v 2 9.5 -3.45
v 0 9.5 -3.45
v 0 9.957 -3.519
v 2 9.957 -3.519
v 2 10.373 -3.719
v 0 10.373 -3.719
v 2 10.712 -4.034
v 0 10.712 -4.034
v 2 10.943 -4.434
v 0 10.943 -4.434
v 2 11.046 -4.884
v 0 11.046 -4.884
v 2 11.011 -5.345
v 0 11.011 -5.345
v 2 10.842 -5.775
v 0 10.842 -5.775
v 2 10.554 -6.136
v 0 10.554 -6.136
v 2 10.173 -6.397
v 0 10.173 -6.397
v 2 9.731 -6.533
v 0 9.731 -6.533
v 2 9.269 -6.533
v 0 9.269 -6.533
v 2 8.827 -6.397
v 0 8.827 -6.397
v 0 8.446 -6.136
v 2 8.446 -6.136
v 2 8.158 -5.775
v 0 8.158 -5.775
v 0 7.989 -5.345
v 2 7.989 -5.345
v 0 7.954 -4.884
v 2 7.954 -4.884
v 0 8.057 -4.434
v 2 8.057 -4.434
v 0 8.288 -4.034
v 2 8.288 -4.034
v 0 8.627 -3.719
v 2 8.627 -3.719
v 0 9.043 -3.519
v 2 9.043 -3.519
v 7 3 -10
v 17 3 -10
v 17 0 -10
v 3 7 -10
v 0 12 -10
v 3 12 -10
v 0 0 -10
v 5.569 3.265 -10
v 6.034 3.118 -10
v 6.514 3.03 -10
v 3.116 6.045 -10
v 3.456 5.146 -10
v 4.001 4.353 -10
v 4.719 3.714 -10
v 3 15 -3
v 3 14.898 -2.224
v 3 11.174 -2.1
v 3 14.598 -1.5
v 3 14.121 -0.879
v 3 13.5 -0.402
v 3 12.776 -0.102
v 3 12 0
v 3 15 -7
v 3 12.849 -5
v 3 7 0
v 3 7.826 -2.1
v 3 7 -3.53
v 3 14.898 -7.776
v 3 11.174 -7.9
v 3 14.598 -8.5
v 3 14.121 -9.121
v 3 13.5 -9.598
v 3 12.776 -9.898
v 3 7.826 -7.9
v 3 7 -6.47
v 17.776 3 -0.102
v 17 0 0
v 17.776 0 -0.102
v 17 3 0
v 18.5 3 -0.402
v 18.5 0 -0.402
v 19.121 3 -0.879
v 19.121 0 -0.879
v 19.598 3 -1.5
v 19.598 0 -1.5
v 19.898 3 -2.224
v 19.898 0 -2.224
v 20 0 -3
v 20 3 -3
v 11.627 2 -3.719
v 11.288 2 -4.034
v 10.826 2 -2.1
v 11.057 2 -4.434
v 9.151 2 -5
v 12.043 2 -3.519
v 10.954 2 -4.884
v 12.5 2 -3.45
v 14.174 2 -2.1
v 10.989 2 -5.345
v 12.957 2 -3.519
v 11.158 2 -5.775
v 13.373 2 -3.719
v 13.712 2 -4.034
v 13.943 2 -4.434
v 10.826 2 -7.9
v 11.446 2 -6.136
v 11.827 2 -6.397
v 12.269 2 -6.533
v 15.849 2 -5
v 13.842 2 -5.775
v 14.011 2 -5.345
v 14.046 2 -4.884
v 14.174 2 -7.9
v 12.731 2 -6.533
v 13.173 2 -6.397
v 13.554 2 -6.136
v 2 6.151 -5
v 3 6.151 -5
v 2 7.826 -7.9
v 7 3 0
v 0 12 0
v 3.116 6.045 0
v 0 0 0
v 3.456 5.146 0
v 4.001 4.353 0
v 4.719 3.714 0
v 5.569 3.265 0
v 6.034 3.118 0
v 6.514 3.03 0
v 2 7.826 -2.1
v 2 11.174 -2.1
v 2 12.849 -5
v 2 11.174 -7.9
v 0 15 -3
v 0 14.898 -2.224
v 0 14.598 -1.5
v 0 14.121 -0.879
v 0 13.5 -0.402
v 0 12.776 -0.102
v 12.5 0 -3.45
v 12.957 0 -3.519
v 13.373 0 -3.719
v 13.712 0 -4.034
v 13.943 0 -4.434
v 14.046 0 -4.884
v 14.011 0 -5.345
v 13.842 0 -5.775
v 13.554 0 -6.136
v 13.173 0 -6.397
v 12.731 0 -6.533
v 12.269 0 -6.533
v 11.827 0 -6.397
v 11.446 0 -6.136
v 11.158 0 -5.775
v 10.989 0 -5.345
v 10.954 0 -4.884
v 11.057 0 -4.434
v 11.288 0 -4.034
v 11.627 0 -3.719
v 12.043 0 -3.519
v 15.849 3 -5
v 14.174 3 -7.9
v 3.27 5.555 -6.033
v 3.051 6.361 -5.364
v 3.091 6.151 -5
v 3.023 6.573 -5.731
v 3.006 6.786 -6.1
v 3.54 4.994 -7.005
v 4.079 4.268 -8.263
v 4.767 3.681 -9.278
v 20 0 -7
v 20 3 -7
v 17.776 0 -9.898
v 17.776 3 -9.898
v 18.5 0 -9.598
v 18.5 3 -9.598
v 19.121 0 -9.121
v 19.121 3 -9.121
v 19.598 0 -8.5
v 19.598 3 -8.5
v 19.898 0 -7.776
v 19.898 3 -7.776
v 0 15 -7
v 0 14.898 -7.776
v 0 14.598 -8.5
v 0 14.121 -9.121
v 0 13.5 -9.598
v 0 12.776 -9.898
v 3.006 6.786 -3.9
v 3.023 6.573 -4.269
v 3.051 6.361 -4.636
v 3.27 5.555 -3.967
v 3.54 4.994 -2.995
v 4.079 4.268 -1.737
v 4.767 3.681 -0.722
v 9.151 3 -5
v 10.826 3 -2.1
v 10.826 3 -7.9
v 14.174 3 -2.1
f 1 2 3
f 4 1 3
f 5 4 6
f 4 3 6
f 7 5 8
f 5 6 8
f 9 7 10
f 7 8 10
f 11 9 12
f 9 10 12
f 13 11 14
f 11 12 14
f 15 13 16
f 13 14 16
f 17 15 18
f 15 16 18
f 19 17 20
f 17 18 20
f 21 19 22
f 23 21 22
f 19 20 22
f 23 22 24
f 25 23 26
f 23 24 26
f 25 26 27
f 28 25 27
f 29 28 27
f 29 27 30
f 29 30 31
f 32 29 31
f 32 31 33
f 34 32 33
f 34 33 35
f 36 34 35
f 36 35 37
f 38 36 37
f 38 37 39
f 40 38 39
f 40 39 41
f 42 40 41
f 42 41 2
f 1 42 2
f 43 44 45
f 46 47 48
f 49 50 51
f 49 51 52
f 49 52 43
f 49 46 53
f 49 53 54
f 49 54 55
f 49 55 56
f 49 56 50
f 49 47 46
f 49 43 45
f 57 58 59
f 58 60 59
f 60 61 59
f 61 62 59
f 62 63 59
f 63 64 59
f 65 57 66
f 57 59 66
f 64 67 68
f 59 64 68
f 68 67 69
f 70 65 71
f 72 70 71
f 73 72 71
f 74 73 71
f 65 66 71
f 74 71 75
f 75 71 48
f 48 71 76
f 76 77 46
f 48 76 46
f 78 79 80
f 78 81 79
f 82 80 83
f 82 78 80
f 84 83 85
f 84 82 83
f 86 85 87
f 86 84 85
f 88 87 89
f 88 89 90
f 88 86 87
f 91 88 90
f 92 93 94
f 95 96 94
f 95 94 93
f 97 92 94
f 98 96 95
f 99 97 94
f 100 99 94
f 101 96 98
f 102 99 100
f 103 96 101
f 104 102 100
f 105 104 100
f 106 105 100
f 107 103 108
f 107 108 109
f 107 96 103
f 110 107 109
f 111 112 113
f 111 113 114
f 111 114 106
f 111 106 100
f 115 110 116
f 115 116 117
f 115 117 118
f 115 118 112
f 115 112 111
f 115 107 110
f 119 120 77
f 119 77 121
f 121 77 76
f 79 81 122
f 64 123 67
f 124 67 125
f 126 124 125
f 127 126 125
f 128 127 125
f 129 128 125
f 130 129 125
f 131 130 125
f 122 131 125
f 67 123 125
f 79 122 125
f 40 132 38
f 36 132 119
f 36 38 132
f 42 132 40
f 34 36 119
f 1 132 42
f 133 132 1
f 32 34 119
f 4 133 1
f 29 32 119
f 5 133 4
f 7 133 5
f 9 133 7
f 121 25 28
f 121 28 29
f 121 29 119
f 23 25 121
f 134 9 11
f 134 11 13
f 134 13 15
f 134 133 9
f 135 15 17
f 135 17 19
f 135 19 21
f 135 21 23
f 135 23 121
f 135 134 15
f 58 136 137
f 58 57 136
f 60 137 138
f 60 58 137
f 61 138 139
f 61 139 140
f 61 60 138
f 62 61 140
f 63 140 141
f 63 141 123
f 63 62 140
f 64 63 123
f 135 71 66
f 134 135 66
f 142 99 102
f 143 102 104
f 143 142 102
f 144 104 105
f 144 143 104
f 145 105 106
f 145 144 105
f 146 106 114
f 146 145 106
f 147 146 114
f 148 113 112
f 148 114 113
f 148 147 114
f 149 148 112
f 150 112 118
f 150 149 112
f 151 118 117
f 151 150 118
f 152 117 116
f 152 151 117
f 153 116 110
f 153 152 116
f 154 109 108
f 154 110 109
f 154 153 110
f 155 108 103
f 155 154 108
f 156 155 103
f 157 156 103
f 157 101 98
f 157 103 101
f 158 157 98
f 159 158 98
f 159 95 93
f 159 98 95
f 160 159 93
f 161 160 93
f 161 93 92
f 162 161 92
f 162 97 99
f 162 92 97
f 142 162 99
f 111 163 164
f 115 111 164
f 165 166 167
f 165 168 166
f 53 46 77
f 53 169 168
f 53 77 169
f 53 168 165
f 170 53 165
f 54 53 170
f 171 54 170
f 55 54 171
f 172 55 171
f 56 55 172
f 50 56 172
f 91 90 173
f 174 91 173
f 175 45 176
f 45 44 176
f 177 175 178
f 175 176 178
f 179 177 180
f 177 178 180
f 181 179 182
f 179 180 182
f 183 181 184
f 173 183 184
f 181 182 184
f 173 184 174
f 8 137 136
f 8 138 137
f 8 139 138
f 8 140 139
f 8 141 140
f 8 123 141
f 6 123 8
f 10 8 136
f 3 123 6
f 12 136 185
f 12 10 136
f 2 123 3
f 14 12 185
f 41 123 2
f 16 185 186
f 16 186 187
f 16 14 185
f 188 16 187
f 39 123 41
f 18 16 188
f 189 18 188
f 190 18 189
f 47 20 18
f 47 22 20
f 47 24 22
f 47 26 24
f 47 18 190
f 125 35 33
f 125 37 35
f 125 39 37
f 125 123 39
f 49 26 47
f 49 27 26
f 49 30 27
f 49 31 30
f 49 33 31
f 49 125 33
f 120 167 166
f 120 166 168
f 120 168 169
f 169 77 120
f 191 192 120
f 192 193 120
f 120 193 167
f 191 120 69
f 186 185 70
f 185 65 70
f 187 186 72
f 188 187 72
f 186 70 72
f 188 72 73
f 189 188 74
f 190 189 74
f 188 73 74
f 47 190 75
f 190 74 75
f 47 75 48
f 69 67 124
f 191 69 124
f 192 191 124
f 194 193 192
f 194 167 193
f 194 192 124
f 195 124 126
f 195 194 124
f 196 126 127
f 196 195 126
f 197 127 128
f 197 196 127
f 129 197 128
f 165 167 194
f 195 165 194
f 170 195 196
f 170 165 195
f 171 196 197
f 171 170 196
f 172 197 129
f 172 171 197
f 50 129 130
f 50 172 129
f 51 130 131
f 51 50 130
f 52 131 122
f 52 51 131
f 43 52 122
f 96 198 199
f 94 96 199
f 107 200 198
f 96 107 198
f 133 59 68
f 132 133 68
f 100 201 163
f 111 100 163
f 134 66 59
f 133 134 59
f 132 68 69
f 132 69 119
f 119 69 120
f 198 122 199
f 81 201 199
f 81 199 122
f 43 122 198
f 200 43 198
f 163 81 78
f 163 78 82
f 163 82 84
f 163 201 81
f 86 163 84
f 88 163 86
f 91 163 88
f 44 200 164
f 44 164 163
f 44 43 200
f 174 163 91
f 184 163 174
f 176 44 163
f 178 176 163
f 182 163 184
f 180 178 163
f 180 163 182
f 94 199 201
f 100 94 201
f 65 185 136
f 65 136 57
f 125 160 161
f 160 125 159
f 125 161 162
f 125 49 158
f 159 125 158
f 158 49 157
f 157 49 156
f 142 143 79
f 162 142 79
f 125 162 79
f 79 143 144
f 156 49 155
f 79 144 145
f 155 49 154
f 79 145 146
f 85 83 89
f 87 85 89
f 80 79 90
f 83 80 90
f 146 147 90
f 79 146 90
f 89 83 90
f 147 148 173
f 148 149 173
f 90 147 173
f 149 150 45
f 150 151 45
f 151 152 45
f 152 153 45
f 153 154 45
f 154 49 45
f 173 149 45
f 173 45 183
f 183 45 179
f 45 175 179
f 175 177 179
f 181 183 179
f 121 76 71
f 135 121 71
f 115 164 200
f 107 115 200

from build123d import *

# Parameters (mm, degrees)
CROQUIS1_W              = 20
CROQUIS1_H              = 10
CROQUIS1_R              = 1.55
SALIENTE_EXTRUIR1_DEPTH = 3
CROQUIS2_W              = 3
CROQUIS2_H              = 10
SALIENTE_EXTRUIR2_DEPTH = 12
CROQUIS3_R              = 1.55
CORTAR_EXTRUIR1_DEPTH   = 3
CORTAR_EXTRUIR3_DEPTH   = 1
REDONDEO1_R             = 3
REDONDEO2_R             = 4
CORTAR_EXTRUIR4_DEPTH   = 1


with BuildPart() as part:
    # Croquis1 → Saliente-Extruir1 (new body)
    with BuildSketch(Plane(origin=(0, 0, 0), x_dir=(1, 0, 0), z_dir=(0, 1, 0))):
        with Locations((10, 5)):
            Rectangle(CROQUIS1_W, CROQUIS1_H)
        with Locations(Location((12.5, 5, 0), (0, 0, 270))):
            Circle(CROQUIS1_R, mode=Mode.SUBTRACT)
    extrude(amount=SALIENTE_EXTRUIR1_DEPTH)

    # Croquis2 → Saliente-Extruir2 (add)
    with BuildSketch(Plane(origin=(0, 3, 0), x_dir=(1, 0, 0), z_dir=(0, 1, 0))):
        with Locations((1.5, 5)):
            Rectangle(CROQUIS2_W, CROQUIS2_H)
    extrude(amount=SALIENTE_EXTRUIR2_DEPTH)

    # Croquis3 → Cortar-Extruir1 (cut)
    with BuildSketch(Plane.ZY):
        with Locations((-5, 9.5)):
            Circle(CROQUIS3_R)
    extrude(amount=-CORTAR_EXTRUIR1_DEPTH, mode=Mode.SUBTRACT)

    # Croquis5 → Cortar-Extruir3 (cut)
    with BuildSketch(Plane(origin=(3, 0, 0), x_dir=(0, 0, -1), z_dir=(1, 0, 0))):
        Polygon((7.9, 11.174315781), (5, 12.848631561), (2.1, 11.174315781), (2.1, 7.825684219), (5, 6.151368439), (7.9, 7.825684219), align=None)
    extrude(amount=-CORTAR_EXTRUIR3_DEPTH, mode=Mode.SUBTRACT)

    # Redondeo1
    redondeo1_edges = [part.edges().sort_by_distance(p)[0] for p in [
        (1.5, 15, 0),
        (1.5, 15, -10),
        (20, 1.5, -10),
        (20, 1.5, 0),
    ]]
    fillet(redondeo1_edges, radius=REDONDEO1_R)

    # Redondeo2
    # the kernel refuses this fillet: 4 mm, written as the material it adds along each edge
    with BuildSketch(Plane(origin=(3, 3, -10), x_dir=(0, 1, 0), z_dir=(0, 0, 1))) as redondeo2_piece_1_section:
        with BuildLine():
            CenterArc((REDONDEO2_R, -REDONDEO2_R), REDONDEO2_R, 90, 90)
            Line((0, -REDONDEO2_R), (0, 0))
            Line((0, 0), (REDONDEO2_R, 0))
        make_face()
    redondeo2_piece_1 = extrude(amount=10, mode=Mode.PRIVATE)
    redondeo2_piece_1 = split(redondeo2_piece_1, bisect_by=Plane(origin=(3.346509798, 4.243965629, -8.303718576), z_dir=(0, 0.8660254037844384, -0.5000000000000007)), keep=Keep.TOP, mode=Mode.PRIVATE)
    redondeo2_piece_1 = split(redondeo2_piece_1, bisect_by=Plane(origin=(3.346509798, 7.41640276, -7.191103718), z_dir=(0, -0.8660254037844387, -0.5)), keep=Keep.TOP, mode=Mode.PRIVATE)
    add(redondeo2_piece_1)
    with BuildSketch(Plane(origin=(3, 3, -10), x_dir=(0, 1, 0), z_dir=(0, 0, 1))) as redondeo2_piece_2_section:
        with BuildLine():
            CenterArc((REDONDEO2_R, -REDONDEO2_R), REDONDEO2_R, 90, 90)
            Line((0, -REDONDEO2_R), (0, 0))
            Line((0, 0), (REDONDEO2_R, 0))
        make_face()
    redondeo2_piece_2 = extrude(amount=10, mode=Mode.PRIVATE)
    redondeo2_piece_2 = split(redondeo2_piece_2, bisect_by=Plane(origin=(4.081067975, 5.513393982, -6.105004173), z_dir=(0, -0.8660254037844384, 0.5000000000000007)), keep=Keep.TOP, mode=Mode.PRIVATE)
    redondeo2_piece_2 = split(redondeo2_piece_2, bisect_by=Plane(origin=(4.081067975, 5.513393982, -3.894995827), z_dir=(0, -0.8660254037844387, -0.5)), keep=Keep.TOP, mode=Mode.PRIVATE)
    add(redondeo2_piece_2)
    with BuildSketch(Plane(origin=(3, 3, -10), x_dir=(0, 1, 0), z_dir=(0, 0, 1))) as redondeo2_piece_3_section:
        with BuildLine():
            CenterArc((REDONDEO2_R, -REDONDEO2_R), REDONDEO2_R, 90, 90)
            Line((0, -REDONDEO2_R), (0, 0))
            Line((0, 0), (REDONDEO2_R, 0))
        make_face()
    redondeo2_piece_3 = extrude(amount=10, mode=Mode.PRIVATE)
    redondeo2_piece_3 = split(redondeo2_piece_3, bisect_by=Plane(origin=(3.346509798, 7.41640276, -2.808896282), z_dir=(0, -0.8660254037844384, 0.5000000000000007)), keep=Keep.TOP, mode=Mode.PRIVATE)
    redondeo2_piece_3 = split(redondeo2_piece_3, bisect_by=Plane(origin=(3.346509798, 4.243965629, -1.696281424), z_dir=(0, 0.8660254037844387, 0.5)), keep=Keep.TOP, mode=Mode.PRIVATE)
    add(redondeo2_piece_3)

    # Croquis6 → Cortar-Extruir4 (cut)
    with BuildSketch(Plane(origin=(0, 3, 0), x_dir=(1, 0, 0), z_dir=(0, 1, 0))):
        Polygon((14.174315781, 7.9), (10.825684219, 7.9), (9.151368439, 5), (10.825684219, 2.1), (14.174315781, 2.1), (15.848631561, 5), align=None)
    extrude(amount=-CORTAR_EXTRUIR4_DEPTH, mode=Mode.SUBTRACT)


solid = part.part
